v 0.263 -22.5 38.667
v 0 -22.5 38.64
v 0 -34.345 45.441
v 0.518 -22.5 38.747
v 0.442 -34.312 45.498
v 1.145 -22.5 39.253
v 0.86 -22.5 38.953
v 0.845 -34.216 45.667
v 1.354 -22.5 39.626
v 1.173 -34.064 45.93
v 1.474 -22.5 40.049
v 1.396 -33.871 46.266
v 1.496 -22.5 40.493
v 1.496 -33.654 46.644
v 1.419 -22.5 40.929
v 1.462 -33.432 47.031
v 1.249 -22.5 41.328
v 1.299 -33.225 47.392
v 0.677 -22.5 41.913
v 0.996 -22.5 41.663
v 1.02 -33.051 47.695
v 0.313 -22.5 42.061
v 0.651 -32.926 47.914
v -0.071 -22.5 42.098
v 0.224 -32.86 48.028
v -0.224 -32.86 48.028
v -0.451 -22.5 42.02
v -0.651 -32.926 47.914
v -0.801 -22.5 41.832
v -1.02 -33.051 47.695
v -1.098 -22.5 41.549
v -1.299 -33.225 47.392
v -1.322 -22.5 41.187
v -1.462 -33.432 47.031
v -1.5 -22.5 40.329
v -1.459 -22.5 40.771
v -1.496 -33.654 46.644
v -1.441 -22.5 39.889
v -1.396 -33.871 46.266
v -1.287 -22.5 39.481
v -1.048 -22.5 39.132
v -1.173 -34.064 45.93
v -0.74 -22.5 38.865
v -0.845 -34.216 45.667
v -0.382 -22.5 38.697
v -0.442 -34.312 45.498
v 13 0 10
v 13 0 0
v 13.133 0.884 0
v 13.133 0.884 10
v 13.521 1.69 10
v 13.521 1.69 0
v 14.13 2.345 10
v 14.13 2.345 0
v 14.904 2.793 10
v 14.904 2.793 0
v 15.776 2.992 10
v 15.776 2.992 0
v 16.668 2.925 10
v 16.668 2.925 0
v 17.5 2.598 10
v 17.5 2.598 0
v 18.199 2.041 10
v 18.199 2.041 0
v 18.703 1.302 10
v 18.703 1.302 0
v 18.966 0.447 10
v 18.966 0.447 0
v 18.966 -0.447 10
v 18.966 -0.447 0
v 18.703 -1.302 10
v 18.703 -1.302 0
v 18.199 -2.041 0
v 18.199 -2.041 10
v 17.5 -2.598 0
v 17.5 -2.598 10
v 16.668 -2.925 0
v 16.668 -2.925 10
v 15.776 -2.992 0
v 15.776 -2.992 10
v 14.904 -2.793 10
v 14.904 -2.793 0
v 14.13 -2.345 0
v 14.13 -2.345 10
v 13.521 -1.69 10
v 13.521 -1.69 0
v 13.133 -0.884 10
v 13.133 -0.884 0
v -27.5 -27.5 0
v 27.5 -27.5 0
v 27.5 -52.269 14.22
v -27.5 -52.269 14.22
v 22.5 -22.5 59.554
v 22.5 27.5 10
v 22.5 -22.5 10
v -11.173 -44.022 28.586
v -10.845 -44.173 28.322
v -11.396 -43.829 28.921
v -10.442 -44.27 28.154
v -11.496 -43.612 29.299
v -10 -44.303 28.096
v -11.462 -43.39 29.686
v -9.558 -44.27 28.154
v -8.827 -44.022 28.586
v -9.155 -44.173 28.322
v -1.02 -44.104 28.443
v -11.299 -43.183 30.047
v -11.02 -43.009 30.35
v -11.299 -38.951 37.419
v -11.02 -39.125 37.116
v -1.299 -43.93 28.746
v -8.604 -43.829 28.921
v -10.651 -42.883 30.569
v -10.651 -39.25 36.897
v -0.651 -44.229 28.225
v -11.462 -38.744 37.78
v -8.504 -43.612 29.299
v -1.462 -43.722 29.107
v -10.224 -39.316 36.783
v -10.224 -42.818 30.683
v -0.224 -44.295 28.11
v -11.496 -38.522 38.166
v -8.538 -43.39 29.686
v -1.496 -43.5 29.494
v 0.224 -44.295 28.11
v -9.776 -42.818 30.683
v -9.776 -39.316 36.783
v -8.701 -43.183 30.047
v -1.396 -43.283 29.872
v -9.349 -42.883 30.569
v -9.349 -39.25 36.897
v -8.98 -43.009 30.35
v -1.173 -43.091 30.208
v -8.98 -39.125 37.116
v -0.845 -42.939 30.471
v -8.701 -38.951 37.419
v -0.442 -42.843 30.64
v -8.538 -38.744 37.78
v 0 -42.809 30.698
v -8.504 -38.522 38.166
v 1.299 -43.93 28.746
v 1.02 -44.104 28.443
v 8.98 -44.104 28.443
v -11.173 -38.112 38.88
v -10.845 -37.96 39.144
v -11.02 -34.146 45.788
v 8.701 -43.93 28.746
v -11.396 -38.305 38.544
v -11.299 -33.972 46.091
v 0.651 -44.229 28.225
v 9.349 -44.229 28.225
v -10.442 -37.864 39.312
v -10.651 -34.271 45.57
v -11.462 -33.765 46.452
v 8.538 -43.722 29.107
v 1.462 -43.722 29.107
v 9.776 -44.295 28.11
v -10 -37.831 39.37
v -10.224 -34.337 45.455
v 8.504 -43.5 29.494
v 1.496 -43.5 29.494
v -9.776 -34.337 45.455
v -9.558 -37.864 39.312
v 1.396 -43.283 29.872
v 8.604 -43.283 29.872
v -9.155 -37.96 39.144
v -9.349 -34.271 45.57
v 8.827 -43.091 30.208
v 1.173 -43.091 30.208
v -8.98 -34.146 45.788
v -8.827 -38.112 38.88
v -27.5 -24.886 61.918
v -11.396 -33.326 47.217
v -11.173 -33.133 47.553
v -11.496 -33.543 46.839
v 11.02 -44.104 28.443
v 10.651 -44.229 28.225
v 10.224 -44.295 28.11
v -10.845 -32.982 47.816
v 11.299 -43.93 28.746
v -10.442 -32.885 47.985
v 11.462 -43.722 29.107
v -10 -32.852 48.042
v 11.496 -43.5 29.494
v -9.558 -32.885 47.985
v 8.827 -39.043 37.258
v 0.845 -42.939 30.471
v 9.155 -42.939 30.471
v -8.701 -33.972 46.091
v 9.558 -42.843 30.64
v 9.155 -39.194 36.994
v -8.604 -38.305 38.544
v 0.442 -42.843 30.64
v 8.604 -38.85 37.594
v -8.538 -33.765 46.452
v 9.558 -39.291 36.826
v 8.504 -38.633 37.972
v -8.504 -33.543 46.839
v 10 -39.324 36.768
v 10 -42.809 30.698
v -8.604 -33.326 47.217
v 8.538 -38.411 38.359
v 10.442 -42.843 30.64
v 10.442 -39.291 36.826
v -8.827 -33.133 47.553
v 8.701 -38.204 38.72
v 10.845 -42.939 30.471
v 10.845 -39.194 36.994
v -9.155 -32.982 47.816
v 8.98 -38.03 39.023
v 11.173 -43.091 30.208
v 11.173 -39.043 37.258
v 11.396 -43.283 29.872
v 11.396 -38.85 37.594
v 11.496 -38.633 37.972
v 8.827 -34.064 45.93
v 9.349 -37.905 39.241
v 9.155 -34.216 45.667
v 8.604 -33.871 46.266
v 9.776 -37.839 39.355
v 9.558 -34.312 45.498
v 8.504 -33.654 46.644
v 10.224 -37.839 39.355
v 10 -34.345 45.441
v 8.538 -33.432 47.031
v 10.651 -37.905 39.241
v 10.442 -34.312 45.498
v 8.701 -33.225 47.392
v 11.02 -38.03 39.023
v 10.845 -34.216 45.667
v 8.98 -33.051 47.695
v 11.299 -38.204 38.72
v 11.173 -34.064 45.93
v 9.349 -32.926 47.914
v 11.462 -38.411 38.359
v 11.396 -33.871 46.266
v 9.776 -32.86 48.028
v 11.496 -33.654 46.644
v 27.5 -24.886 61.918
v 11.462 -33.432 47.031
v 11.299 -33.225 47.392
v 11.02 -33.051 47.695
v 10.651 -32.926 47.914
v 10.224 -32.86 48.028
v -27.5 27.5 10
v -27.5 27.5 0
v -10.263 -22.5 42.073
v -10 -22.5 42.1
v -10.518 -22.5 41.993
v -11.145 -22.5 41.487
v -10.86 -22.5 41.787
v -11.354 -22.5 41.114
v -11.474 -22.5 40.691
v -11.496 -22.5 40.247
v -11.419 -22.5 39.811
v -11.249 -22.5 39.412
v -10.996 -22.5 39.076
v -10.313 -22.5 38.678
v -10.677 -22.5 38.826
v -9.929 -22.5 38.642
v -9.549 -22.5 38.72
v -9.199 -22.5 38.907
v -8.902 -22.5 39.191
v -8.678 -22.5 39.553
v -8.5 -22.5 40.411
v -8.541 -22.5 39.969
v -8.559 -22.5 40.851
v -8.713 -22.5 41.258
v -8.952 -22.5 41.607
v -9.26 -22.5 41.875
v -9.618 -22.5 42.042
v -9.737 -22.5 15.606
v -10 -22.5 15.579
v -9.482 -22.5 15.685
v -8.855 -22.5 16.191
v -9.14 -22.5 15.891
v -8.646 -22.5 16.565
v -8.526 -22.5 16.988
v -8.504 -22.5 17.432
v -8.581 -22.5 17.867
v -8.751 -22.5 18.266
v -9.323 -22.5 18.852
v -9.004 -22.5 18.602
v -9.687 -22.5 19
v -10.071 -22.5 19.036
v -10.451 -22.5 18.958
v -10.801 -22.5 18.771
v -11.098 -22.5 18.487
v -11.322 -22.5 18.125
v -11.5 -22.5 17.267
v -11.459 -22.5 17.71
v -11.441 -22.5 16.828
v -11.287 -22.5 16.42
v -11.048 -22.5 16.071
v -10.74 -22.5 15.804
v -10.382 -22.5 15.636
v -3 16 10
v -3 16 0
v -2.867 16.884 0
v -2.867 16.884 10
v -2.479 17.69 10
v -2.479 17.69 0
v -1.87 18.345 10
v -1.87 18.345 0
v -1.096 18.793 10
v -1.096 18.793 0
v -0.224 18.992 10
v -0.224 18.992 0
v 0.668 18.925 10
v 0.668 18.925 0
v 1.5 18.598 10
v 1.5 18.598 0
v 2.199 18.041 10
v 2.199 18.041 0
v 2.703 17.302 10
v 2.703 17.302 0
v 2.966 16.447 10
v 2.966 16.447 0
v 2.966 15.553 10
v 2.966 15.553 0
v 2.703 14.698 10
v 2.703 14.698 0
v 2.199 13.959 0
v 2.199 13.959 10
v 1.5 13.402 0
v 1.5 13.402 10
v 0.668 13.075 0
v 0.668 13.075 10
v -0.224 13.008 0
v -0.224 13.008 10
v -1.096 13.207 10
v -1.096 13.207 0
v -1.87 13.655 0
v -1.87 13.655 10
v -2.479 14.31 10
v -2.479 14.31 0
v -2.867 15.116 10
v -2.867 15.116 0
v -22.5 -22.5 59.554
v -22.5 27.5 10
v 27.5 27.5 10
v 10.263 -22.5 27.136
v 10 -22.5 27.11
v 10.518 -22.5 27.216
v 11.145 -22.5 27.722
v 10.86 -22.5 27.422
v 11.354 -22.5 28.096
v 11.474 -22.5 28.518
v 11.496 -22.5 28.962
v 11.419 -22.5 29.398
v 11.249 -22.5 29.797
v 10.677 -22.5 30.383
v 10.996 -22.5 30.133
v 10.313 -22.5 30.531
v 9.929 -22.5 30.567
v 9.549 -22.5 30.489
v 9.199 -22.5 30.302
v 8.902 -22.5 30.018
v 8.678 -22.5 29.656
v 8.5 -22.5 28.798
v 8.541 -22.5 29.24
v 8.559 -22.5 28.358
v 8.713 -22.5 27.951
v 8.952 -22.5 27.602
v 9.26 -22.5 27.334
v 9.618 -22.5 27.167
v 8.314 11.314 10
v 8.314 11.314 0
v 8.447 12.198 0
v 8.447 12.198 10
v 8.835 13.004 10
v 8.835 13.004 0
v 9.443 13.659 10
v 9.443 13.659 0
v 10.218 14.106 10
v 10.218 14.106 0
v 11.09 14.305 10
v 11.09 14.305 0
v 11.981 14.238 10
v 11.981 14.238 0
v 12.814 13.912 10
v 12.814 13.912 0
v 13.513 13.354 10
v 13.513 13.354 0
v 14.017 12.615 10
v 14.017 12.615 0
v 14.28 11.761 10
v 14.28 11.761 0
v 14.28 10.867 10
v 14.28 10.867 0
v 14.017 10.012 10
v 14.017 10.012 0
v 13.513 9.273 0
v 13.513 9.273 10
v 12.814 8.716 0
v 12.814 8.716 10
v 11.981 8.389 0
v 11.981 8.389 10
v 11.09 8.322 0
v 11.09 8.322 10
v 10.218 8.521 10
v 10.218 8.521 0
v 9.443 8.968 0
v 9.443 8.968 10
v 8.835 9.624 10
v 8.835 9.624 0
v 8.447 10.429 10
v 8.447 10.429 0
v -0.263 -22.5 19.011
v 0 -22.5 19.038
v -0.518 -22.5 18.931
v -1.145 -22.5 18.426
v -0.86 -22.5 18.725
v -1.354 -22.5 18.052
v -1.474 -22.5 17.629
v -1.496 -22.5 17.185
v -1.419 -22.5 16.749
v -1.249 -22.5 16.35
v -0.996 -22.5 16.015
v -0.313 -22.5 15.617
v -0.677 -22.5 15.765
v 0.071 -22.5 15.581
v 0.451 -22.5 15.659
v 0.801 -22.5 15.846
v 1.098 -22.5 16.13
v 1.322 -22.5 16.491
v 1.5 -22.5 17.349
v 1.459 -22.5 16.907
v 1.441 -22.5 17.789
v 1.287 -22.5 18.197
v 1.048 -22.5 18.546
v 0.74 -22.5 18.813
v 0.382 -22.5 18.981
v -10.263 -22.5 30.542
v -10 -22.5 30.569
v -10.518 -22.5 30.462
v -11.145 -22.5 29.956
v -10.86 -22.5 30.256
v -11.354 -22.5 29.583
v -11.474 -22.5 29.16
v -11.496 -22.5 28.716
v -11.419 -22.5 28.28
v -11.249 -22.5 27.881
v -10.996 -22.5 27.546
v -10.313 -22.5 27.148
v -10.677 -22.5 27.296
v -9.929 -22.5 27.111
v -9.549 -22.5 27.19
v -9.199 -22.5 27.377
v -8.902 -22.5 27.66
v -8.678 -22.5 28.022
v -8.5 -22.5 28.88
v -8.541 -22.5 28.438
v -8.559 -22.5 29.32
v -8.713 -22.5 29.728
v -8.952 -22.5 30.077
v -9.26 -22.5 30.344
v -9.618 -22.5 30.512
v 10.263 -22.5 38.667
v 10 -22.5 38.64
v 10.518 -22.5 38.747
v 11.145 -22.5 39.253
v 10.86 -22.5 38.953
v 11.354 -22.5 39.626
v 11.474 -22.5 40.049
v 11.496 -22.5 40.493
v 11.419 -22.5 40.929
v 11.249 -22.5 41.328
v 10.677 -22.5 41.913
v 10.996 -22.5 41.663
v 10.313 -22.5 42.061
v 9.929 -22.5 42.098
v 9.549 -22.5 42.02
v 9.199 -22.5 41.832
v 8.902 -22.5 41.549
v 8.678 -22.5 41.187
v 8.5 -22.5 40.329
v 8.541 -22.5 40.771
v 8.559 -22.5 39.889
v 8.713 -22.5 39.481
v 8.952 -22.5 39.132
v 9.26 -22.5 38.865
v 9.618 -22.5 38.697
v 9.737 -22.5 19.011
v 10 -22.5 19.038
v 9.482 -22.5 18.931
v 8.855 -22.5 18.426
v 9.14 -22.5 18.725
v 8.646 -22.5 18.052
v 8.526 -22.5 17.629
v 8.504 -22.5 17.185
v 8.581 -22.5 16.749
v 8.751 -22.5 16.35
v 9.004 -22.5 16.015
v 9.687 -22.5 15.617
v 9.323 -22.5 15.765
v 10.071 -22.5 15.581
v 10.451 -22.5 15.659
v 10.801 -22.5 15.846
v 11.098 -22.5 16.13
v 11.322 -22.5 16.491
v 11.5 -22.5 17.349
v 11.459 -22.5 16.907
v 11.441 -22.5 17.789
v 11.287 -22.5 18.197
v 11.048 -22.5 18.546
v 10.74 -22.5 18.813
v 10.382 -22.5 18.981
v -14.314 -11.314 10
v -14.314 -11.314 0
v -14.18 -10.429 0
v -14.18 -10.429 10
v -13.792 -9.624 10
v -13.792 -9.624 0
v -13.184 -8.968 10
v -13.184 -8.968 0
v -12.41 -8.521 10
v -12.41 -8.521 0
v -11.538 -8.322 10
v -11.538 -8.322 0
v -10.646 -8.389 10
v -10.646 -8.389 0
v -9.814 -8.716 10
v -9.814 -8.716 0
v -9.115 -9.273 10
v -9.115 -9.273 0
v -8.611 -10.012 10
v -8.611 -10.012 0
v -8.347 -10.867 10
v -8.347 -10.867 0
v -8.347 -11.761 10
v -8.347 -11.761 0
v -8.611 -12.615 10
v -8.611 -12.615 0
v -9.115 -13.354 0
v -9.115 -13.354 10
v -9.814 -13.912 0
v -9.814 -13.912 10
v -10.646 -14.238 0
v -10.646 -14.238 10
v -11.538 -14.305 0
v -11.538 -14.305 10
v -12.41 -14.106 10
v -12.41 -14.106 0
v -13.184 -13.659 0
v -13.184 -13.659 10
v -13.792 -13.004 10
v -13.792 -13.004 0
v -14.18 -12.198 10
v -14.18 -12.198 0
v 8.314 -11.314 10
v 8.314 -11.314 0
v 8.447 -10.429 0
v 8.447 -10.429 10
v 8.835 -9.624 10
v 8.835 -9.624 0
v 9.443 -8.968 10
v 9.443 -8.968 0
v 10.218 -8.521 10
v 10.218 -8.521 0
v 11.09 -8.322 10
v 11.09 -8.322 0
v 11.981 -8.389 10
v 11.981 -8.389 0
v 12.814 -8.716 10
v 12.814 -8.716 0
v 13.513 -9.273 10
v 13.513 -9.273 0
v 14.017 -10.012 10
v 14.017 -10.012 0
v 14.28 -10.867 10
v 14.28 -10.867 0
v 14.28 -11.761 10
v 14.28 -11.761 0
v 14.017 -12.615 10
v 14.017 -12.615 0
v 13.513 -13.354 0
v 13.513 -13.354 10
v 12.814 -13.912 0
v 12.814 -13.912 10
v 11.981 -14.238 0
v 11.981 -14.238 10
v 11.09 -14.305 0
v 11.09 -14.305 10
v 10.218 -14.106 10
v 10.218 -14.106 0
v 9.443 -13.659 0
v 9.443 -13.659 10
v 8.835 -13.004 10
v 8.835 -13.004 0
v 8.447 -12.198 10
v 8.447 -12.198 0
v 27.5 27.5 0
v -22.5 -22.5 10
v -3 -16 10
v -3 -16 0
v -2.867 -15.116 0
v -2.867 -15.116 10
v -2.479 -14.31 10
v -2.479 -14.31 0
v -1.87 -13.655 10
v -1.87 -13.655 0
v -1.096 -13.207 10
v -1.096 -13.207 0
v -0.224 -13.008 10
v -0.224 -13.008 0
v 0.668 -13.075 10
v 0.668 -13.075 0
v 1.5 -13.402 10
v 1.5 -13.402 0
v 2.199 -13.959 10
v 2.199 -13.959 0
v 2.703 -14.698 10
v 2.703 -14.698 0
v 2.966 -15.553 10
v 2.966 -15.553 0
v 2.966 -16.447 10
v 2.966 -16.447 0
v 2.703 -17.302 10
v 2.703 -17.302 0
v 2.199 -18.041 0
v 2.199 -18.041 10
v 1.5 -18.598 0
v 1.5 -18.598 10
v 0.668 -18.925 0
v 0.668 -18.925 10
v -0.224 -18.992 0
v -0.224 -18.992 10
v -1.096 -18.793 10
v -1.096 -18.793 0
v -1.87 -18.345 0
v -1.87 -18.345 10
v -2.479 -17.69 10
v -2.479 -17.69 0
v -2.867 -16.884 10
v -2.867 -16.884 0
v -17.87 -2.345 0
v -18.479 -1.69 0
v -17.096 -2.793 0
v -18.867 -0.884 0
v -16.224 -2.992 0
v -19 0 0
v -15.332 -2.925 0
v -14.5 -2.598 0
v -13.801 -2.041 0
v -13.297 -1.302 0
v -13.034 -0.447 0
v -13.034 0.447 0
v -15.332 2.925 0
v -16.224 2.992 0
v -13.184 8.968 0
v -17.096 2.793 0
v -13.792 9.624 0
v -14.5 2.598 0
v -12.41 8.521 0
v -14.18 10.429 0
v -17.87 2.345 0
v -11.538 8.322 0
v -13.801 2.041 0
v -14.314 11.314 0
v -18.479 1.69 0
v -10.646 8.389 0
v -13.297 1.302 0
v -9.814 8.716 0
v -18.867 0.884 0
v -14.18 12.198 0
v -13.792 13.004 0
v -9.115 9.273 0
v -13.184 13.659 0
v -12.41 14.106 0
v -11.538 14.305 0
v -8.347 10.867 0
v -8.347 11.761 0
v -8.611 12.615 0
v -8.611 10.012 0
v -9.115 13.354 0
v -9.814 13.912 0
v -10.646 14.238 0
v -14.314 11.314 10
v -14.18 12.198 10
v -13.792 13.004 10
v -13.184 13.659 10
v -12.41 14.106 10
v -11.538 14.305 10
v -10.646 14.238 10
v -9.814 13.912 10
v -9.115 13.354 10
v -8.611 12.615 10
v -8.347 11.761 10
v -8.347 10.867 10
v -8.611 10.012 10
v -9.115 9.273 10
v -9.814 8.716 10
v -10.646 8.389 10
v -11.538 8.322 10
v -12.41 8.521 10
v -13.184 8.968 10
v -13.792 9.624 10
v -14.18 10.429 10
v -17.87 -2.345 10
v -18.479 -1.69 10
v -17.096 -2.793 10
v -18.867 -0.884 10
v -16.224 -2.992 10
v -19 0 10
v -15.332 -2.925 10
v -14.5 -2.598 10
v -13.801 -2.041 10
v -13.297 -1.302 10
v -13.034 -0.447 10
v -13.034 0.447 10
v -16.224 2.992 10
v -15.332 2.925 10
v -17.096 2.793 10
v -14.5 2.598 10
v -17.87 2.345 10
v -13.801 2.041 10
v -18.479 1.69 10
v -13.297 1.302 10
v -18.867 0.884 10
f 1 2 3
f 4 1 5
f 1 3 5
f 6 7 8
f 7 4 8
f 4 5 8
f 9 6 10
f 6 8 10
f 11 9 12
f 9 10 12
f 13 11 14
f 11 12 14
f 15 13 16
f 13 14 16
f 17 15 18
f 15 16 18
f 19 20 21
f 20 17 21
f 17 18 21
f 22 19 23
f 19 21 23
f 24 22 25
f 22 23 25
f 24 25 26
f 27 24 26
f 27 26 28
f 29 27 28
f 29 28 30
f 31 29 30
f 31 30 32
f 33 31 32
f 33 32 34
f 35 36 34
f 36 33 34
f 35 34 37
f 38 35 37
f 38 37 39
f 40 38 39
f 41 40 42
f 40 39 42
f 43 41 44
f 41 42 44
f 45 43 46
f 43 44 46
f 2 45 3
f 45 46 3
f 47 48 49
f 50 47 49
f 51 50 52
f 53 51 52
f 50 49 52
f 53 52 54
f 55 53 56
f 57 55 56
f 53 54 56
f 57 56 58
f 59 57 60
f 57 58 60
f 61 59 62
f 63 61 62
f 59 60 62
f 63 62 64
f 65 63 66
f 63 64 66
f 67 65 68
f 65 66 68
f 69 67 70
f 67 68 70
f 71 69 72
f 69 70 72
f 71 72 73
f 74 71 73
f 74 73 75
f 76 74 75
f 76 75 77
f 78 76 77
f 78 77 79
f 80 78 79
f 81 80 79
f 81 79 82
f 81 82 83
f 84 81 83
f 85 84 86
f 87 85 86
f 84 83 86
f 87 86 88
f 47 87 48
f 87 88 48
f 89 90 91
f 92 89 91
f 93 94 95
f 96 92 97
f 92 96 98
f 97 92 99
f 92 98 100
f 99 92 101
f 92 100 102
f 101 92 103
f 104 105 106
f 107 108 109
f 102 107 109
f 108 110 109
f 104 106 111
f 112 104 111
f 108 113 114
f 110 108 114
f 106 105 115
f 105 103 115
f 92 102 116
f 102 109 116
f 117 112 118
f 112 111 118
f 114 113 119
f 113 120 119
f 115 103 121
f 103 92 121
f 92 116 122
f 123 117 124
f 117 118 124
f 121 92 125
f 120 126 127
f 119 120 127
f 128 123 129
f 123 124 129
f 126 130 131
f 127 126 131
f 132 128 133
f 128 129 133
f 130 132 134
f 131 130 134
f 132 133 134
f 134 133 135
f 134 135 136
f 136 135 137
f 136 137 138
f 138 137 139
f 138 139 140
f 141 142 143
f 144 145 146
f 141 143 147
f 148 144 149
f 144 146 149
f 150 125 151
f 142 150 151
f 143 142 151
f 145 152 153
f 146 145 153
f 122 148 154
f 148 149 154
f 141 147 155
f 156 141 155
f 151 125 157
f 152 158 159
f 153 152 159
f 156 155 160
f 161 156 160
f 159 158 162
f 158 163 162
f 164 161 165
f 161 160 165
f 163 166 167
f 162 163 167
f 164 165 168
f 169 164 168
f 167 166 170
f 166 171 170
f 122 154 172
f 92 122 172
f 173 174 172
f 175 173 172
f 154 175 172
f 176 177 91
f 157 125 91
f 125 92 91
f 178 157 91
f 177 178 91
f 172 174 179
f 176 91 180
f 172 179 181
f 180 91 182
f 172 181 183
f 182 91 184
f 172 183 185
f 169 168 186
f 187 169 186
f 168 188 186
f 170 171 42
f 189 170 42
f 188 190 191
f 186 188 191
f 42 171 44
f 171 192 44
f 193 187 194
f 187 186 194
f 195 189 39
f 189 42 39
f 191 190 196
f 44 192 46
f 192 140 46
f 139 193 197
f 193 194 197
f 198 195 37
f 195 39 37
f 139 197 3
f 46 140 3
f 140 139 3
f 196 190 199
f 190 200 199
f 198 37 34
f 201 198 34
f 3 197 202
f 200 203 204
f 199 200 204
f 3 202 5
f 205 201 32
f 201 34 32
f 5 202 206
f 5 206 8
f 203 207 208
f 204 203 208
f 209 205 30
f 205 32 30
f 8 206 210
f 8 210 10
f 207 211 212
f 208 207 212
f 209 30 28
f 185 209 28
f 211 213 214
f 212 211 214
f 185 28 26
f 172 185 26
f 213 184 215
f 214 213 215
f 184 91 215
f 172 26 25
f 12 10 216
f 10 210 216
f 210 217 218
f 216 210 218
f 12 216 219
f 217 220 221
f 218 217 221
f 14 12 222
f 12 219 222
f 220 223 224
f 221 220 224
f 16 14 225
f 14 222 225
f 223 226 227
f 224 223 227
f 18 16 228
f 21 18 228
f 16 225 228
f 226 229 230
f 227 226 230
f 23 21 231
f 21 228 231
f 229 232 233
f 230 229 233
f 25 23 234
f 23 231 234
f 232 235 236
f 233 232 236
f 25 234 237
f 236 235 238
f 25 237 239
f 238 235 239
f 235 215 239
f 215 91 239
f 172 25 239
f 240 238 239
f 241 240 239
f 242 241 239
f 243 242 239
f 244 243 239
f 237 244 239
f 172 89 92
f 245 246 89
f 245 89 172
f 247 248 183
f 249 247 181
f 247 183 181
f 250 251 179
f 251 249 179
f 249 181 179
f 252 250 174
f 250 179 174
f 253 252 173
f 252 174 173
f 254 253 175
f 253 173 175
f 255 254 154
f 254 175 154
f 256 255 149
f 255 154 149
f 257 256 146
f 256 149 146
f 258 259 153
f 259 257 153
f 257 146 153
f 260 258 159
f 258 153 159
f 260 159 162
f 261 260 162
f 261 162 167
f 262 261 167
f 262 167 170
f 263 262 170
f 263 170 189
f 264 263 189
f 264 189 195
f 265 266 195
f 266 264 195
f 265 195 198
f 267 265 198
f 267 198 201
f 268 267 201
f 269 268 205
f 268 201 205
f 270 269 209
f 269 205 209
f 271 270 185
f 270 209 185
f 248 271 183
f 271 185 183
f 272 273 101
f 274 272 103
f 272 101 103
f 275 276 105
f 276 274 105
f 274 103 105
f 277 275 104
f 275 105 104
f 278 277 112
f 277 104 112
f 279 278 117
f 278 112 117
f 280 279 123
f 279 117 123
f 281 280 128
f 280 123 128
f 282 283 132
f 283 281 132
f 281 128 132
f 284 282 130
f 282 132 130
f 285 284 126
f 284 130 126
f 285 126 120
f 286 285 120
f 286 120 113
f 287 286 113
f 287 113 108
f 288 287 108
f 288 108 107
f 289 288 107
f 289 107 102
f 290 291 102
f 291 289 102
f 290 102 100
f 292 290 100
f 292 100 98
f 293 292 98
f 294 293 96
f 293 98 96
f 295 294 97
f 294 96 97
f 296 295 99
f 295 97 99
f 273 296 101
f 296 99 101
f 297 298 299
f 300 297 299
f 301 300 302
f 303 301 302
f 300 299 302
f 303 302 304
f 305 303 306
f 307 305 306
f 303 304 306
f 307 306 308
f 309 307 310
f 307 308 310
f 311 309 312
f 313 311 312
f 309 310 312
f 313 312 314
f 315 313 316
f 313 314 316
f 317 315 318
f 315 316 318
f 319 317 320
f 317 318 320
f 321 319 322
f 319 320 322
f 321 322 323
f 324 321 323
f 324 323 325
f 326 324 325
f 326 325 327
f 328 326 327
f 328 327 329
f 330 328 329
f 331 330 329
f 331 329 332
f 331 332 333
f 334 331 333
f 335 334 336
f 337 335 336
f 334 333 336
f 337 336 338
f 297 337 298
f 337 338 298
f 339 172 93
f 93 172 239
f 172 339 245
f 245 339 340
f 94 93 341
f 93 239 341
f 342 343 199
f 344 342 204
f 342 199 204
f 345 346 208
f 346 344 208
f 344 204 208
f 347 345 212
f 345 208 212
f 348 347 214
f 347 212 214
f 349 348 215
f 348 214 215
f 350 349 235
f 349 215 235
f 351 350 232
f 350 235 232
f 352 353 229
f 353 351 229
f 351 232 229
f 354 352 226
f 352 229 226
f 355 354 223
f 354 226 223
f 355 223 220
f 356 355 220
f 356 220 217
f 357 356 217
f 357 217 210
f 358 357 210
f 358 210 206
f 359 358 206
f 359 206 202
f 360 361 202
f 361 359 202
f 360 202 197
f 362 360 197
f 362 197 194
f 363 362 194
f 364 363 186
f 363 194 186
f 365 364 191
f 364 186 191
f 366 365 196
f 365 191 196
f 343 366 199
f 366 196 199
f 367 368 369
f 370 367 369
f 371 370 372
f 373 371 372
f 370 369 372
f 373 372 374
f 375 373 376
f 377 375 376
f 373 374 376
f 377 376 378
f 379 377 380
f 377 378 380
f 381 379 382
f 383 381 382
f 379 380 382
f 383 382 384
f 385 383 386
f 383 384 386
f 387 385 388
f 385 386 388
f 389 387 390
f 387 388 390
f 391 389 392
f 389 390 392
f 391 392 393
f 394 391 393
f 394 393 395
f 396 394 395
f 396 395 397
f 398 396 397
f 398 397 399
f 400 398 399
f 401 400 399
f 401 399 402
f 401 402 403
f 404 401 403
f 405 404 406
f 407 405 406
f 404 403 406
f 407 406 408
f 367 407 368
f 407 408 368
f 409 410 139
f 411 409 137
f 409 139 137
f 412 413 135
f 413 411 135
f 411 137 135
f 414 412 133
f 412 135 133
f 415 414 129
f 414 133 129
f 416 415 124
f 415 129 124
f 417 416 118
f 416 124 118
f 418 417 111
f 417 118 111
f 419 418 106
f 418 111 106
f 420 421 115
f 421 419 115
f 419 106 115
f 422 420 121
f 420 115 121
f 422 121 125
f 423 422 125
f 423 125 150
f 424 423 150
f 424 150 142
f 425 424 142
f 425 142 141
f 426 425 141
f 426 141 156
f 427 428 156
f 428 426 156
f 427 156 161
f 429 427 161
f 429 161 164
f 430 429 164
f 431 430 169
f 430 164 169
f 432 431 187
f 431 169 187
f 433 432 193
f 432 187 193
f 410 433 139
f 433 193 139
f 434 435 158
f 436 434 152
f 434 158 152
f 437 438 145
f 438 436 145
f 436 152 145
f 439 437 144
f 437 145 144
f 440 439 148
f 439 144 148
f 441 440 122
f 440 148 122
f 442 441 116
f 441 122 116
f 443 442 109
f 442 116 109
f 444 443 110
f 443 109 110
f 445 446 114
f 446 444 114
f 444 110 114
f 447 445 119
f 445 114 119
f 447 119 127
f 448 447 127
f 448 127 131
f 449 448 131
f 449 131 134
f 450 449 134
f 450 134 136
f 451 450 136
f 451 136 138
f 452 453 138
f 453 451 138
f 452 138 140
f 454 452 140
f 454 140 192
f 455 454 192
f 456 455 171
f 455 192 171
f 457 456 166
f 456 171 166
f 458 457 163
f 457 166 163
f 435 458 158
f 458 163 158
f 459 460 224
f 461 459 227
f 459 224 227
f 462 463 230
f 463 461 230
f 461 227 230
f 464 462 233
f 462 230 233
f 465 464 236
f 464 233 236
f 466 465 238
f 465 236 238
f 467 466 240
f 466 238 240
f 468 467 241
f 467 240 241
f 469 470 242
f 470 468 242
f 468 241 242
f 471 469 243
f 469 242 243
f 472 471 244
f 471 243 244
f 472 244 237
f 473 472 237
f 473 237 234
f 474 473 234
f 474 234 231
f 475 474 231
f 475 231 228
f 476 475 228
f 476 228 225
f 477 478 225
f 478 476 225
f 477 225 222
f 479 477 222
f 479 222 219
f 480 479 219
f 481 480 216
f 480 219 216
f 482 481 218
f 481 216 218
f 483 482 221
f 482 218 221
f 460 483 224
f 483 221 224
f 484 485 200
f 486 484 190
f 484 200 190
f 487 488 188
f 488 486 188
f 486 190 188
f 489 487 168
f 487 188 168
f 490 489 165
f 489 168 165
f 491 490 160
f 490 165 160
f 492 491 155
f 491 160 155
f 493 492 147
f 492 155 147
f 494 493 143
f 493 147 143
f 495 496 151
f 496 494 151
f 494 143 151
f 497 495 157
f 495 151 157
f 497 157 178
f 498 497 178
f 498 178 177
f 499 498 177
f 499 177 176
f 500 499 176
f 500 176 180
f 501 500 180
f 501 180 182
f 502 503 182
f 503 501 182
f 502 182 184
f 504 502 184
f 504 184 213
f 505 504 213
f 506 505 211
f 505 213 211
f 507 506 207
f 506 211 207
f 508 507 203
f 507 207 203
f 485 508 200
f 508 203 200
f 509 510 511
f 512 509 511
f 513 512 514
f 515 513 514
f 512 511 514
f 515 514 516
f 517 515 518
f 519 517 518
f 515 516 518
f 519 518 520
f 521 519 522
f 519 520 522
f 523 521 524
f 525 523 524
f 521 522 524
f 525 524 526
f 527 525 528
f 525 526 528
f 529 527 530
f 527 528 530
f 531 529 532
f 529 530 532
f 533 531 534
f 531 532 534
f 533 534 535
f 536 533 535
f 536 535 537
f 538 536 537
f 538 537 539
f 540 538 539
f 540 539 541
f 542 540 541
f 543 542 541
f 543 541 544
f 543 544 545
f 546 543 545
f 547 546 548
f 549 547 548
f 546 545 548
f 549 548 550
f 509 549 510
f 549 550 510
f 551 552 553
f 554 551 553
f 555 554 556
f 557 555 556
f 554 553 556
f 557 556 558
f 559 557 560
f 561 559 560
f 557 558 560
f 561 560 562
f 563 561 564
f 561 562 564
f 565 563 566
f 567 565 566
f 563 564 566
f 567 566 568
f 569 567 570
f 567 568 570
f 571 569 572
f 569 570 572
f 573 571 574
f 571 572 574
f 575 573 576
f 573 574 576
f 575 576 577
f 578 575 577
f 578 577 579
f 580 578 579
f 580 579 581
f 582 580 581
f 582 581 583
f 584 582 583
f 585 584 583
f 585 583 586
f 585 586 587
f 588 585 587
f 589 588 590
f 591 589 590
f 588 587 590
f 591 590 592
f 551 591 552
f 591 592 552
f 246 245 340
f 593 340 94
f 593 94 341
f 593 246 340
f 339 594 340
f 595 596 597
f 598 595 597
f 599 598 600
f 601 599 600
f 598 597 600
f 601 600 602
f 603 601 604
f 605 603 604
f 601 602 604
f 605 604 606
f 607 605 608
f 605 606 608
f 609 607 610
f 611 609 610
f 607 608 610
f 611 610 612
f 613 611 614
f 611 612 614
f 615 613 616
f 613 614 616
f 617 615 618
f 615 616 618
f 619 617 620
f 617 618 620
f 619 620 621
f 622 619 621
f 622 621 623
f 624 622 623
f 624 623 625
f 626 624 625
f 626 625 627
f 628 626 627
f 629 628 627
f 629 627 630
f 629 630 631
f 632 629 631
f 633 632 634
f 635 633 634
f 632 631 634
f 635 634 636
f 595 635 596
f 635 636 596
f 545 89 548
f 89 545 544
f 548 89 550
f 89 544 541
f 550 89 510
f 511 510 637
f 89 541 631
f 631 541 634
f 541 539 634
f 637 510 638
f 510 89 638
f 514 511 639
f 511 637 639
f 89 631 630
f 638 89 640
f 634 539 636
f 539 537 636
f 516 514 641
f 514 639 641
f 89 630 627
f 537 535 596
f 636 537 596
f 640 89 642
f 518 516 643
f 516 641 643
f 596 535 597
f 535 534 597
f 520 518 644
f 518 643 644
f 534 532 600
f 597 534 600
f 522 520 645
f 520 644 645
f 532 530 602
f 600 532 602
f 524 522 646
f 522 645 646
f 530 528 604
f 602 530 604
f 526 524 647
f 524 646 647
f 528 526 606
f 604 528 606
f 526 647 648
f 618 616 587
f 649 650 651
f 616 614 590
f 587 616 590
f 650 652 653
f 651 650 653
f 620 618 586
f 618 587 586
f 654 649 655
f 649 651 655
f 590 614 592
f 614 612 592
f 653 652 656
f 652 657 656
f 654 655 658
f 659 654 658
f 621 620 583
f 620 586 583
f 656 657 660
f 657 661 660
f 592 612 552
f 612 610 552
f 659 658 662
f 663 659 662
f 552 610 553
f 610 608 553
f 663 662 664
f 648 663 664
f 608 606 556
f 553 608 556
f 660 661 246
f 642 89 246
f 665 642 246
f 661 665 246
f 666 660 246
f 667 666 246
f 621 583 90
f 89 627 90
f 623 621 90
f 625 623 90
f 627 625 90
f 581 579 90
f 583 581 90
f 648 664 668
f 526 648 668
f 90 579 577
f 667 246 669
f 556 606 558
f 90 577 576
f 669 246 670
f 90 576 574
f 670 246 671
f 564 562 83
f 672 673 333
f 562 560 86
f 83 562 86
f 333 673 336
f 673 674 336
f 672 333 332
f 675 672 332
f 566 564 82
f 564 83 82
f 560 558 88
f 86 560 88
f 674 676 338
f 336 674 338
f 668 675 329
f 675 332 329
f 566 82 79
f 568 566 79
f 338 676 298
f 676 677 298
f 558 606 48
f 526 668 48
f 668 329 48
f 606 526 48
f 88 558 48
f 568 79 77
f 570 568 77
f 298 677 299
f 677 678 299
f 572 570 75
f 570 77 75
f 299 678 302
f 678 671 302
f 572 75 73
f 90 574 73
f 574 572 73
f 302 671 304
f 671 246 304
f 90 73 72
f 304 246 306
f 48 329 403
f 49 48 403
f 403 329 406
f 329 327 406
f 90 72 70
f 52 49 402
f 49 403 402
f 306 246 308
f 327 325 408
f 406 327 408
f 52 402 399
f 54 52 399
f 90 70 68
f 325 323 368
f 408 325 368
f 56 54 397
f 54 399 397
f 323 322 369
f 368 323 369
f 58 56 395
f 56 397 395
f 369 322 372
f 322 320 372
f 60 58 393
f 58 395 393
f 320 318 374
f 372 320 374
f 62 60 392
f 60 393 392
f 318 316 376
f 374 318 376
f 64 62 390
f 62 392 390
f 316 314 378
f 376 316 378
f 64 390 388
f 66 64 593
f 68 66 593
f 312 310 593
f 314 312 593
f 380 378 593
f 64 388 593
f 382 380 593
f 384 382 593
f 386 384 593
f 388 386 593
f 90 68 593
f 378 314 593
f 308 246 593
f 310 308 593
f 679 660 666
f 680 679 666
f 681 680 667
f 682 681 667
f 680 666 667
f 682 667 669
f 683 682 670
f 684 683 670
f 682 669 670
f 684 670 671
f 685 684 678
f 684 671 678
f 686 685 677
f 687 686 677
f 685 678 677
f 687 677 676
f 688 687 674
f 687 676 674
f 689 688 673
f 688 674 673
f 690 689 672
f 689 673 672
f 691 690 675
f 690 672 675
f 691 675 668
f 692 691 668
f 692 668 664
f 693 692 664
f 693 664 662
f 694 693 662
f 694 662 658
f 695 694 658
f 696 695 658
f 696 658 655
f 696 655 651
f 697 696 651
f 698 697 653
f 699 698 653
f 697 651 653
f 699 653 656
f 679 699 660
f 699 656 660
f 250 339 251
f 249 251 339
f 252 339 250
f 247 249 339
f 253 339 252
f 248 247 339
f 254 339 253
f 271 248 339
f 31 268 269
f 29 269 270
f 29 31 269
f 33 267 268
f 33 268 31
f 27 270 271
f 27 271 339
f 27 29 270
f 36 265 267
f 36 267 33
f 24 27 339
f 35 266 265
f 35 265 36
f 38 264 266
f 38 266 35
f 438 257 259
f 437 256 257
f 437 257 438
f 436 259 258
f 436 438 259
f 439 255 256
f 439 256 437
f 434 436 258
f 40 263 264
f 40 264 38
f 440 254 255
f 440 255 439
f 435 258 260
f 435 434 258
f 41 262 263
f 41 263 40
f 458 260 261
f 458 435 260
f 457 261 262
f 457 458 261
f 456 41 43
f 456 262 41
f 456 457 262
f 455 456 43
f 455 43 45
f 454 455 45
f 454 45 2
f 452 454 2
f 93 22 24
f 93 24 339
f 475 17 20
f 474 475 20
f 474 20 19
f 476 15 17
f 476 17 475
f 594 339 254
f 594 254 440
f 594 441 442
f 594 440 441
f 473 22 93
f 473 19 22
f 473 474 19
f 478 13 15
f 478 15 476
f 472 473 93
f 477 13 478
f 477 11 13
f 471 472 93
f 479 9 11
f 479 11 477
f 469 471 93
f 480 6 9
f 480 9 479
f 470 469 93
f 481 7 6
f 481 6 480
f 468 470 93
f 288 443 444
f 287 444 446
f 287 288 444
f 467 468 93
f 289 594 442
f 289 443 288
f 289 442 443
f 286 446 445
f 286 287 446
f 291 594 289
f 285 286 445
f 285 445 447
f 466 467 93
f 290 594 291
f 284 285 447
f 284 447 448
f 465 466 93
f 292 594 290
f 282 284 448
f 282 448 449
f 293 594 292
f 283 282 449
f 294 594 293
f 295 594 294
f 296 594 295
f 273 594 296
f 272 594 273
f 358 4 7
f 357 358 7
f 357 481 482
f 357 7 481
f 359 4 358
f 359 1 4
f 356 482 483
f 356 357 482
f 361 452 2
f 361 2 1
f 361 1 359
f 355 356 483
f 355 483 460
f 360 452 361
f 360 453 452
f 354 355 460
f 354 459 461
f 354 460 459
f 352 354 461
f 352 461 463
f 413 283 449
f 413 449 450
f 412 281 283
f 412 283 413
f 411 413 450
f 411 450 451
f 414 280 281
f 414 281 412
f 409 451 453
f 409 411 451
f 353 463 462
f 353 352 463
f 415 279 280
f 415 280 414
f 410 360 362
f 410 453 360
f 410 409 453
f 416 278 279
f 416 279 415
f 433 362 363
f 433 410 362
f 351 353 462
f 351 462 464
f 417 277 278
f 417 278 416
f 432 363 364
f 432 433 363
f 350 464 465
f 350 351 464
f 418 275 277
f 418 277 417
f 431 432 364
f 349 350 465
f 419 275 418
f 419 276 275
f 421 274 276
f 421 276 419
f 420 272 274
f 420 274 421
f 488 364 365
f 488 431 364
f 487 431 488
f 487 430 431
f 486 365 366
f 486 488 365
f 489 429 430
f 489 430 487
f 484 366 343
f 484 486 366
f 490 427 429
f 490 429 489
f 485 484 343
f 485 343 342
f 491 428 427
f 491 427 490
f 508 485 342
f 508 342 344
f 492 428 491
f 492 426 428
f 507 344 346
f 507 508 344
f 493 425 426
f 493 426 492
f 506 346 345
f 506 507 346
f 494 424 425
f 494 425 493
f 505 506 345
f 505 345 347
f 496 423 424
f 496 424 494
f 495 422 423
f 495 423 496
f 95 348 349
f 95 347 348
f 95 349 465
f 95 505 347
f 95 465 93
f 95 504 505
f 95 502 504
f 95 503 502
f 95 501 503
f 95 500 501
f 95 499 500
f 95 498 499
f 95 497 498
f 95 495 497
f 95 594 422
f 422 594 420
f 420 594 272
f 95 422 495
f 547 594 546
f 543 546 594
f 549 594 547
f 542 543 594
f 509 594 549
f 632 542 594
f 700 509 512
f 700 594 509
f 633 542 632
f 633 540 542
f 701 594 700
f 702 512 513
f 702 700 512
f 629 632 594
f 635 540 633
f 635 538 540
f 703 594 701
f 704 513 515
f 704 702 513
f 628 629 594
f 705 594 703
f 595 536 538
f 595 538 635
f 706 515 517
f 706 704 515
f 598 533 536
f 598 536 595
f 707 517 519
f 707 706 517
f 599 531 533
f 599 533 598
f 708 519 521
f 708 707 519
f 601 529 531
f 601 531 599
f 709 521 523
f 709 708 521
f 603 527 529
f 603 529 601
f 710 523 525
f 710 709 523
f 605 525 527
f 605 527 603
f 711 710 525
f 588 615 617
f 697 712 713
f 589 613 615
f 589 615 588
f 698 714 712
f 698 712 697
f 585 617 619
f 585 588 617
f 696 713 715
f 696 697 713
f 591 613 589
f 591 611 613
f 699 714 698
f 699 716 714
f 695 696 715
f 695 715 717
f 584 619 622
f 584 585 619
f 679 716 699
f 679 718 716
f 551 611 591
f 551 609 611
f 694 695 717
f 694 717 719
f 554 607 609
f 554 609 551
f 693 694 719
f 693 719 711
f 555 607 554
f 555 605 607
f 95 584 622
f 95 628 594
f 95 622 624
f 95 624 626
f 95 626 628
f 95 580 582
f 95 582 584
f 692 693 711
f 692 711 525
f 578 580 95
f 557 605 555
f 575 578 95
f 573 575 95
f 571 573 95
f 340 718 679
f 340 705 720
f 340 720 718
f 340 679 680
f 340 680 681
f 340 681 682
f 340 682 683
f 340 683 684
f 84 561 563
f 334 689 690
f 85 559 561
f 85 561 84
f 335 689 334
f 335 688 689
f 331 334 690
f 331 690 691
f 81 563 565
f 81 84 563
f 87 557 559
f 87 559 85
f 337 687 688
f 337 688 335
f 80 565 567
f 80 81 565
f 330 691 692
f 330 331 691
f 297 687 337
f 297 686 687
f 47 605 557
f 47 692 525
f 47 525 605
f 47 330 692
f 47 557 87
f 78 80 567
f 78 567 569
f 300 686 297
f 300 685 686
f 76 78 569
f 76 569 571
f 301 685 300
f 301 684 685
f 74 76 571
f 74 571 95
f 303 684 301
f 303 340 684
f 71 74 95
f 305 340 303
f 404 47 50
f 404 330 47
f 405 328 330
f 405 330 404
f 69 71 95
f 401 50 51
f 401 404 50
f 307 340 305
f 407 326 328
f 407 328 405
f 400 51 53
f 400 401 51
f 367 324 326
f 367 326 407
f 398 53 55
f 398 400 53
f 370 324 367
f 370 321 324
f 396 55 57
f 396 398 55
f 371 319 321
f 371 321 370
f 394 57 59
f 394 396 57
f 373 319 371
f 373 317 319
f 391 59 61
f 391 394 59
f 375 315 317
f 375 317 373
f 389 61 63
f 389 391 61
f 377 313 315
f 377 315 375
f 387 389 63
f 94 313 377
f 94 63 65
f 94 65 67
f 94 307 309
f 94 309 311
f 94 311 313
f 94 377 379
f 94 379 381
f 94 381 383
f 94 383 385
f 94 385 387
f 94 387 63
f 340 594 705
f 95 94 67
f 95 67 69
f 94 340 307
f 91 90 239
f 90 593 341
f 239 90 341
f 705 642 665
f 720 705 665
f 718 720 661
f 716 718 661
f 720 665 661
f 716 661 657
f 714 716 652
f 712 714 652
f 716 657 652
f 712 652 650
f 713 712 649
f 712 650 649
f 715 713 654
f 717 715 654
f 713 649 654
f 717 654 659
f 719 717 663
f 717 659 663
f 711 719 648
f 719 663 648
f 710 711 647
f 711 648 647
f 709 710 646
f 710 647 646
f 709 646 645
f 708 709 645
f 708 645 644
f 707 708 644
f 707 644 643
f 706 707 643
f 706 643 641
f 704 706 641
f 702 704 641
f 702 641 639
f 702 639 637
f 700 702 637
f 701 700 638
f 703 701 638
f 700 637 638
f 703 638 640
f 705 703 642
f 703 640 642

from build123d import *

# Parameters (mm, degrees)
SKETCH_1_W          = 55
SKETCH_1_H          = 55
EXTRUDE_1_DEPTH     = 10
EXTRUDE_2_DEPTH     = 55
CUT_EXTRUDE_1_DEPTH = 50
SKETCH_4_R          = 3
CUT_EXTRUDE_2_DEPTH = 10
SKETCH_5_R          = 1.5
CUT_EXTRUDE_3_DEPTH = 30


with BuildPart() as part:
    # 草图1 → 凸台-拉伸1 (new body)
    with BuildSketch(Plane.XY):
        Rectangle(SKETCH_1_W, SKETCH_1_H)
    extrude(amount=EXTRUDE_1_DEPTH)

    # 草图2 → 凸台-拉伸2 (add)
    with BuildSketch(Plane(origin=(27.5, 0, 0), x_dir=(0, 0, -1), z_dir=(1, 0, 0))):
        Polygon((0, -27.5), (-14.219889521, -52.26914509), (-61.918339647, -24.885612528), (-10, 27.5), align=None)
    extrude(amount=-EXTRUDE_2_DEPTH)

    # 草图3 → 切除-拉伸1 (cut)
    with BuildSketch(Plane(origin=(0, 0, 10), x_dir=(-1, 0, 0), z_dir=(0, 0, -1))):
        Polygon((22.5, 22.5), (22.5, -22.5), (-22.5, -22.5), (-22.5, 22.5), (-22.5, 36.625124929), (22.5, 36.625124929), align=None)
    extrude(amount=-CUT_EXTRUDE_1_DEPTH, mode=Mode.SUBTRACT)

    # 草图4 → 切除-拉伸2 (cut)
    with BuildSketch(Plane(origin=(0, 0, 0), x_dir=(-1, 0, 0), z_dir=(0, 0, -1))):
        with Locations((16, 0)):
            Circle(SKETCH_4_R)
        with Locations((11.313708499, -11.313708499)):
            Circle(SKETCH_4_R)
        with Locations((0, -16)):
            Circle(SKETCH_4_R)
        with Locations((-11.313708499, -11.313708499)):
            Circle(SKETCH_4_R)
        with Locations((-16, 0)):
            Circle(SKETCH_4_R)
        with Locations((-11.313708499, 11.313708499)):
            Circle(SKETCH_4_R)
        with Locations((0, 16)):
            Circle(SKETCH_4_R)
        with Locations((11.313708499, 11.313708499)):
            Circle(SKETCH_4_R)
    extrude(amount=-CUT_EXTRUDE_2_DEPTH, mode=Mode.SUBTRACT)

    # 草图5 → 切除-拉伸3 (cut)
    with BuildSketch(Plane(origin=(0, -45.452255494, 26.093999177), x_dir=(1, 0, 0), z_dir=(0, -0.8672445477434421, 0.4978824102228085))):
        with Locations(Location((10, 23.808233719, 0), (0, 0, 270))):
            Circle(SKETCH_5_R)
        with Locations(Location((10, 13.808233719, 0), (0, 0, 270))):
            Circle(SKETCH_5_R)
        with Locations(Location((0, 23.808233719, 0), (0, 0, 270))):
            Circle(SKETCH_5_R)
        with Locations(Location((-10, 23.808233719, 0), (0, 0, 90))):
            Circle(SKETCH_5_R)
        with Locations(Location((-10, 13.808233719, 0), (0, 0, 90))):
            Circle(SKETCH_5_R)
        with Locations(Location((-10, 3.808233719, 0), (0, 0, 270))):
            Circle(SKETCH_5_R)
        with Locations(Location((0, 3.808233719, 0), (0, 0, 90))):
            Circle(SKETCH_5_R)
        with Locations(Location((10, 3.808233719, 0), (0, 0, 90))):
            Circle(SKETCH_5_R)
    extrude(amount=-CUT_EXTRUDE_3_DEPTH, mode=Mode.SUBTRACT)


solid = part.part
